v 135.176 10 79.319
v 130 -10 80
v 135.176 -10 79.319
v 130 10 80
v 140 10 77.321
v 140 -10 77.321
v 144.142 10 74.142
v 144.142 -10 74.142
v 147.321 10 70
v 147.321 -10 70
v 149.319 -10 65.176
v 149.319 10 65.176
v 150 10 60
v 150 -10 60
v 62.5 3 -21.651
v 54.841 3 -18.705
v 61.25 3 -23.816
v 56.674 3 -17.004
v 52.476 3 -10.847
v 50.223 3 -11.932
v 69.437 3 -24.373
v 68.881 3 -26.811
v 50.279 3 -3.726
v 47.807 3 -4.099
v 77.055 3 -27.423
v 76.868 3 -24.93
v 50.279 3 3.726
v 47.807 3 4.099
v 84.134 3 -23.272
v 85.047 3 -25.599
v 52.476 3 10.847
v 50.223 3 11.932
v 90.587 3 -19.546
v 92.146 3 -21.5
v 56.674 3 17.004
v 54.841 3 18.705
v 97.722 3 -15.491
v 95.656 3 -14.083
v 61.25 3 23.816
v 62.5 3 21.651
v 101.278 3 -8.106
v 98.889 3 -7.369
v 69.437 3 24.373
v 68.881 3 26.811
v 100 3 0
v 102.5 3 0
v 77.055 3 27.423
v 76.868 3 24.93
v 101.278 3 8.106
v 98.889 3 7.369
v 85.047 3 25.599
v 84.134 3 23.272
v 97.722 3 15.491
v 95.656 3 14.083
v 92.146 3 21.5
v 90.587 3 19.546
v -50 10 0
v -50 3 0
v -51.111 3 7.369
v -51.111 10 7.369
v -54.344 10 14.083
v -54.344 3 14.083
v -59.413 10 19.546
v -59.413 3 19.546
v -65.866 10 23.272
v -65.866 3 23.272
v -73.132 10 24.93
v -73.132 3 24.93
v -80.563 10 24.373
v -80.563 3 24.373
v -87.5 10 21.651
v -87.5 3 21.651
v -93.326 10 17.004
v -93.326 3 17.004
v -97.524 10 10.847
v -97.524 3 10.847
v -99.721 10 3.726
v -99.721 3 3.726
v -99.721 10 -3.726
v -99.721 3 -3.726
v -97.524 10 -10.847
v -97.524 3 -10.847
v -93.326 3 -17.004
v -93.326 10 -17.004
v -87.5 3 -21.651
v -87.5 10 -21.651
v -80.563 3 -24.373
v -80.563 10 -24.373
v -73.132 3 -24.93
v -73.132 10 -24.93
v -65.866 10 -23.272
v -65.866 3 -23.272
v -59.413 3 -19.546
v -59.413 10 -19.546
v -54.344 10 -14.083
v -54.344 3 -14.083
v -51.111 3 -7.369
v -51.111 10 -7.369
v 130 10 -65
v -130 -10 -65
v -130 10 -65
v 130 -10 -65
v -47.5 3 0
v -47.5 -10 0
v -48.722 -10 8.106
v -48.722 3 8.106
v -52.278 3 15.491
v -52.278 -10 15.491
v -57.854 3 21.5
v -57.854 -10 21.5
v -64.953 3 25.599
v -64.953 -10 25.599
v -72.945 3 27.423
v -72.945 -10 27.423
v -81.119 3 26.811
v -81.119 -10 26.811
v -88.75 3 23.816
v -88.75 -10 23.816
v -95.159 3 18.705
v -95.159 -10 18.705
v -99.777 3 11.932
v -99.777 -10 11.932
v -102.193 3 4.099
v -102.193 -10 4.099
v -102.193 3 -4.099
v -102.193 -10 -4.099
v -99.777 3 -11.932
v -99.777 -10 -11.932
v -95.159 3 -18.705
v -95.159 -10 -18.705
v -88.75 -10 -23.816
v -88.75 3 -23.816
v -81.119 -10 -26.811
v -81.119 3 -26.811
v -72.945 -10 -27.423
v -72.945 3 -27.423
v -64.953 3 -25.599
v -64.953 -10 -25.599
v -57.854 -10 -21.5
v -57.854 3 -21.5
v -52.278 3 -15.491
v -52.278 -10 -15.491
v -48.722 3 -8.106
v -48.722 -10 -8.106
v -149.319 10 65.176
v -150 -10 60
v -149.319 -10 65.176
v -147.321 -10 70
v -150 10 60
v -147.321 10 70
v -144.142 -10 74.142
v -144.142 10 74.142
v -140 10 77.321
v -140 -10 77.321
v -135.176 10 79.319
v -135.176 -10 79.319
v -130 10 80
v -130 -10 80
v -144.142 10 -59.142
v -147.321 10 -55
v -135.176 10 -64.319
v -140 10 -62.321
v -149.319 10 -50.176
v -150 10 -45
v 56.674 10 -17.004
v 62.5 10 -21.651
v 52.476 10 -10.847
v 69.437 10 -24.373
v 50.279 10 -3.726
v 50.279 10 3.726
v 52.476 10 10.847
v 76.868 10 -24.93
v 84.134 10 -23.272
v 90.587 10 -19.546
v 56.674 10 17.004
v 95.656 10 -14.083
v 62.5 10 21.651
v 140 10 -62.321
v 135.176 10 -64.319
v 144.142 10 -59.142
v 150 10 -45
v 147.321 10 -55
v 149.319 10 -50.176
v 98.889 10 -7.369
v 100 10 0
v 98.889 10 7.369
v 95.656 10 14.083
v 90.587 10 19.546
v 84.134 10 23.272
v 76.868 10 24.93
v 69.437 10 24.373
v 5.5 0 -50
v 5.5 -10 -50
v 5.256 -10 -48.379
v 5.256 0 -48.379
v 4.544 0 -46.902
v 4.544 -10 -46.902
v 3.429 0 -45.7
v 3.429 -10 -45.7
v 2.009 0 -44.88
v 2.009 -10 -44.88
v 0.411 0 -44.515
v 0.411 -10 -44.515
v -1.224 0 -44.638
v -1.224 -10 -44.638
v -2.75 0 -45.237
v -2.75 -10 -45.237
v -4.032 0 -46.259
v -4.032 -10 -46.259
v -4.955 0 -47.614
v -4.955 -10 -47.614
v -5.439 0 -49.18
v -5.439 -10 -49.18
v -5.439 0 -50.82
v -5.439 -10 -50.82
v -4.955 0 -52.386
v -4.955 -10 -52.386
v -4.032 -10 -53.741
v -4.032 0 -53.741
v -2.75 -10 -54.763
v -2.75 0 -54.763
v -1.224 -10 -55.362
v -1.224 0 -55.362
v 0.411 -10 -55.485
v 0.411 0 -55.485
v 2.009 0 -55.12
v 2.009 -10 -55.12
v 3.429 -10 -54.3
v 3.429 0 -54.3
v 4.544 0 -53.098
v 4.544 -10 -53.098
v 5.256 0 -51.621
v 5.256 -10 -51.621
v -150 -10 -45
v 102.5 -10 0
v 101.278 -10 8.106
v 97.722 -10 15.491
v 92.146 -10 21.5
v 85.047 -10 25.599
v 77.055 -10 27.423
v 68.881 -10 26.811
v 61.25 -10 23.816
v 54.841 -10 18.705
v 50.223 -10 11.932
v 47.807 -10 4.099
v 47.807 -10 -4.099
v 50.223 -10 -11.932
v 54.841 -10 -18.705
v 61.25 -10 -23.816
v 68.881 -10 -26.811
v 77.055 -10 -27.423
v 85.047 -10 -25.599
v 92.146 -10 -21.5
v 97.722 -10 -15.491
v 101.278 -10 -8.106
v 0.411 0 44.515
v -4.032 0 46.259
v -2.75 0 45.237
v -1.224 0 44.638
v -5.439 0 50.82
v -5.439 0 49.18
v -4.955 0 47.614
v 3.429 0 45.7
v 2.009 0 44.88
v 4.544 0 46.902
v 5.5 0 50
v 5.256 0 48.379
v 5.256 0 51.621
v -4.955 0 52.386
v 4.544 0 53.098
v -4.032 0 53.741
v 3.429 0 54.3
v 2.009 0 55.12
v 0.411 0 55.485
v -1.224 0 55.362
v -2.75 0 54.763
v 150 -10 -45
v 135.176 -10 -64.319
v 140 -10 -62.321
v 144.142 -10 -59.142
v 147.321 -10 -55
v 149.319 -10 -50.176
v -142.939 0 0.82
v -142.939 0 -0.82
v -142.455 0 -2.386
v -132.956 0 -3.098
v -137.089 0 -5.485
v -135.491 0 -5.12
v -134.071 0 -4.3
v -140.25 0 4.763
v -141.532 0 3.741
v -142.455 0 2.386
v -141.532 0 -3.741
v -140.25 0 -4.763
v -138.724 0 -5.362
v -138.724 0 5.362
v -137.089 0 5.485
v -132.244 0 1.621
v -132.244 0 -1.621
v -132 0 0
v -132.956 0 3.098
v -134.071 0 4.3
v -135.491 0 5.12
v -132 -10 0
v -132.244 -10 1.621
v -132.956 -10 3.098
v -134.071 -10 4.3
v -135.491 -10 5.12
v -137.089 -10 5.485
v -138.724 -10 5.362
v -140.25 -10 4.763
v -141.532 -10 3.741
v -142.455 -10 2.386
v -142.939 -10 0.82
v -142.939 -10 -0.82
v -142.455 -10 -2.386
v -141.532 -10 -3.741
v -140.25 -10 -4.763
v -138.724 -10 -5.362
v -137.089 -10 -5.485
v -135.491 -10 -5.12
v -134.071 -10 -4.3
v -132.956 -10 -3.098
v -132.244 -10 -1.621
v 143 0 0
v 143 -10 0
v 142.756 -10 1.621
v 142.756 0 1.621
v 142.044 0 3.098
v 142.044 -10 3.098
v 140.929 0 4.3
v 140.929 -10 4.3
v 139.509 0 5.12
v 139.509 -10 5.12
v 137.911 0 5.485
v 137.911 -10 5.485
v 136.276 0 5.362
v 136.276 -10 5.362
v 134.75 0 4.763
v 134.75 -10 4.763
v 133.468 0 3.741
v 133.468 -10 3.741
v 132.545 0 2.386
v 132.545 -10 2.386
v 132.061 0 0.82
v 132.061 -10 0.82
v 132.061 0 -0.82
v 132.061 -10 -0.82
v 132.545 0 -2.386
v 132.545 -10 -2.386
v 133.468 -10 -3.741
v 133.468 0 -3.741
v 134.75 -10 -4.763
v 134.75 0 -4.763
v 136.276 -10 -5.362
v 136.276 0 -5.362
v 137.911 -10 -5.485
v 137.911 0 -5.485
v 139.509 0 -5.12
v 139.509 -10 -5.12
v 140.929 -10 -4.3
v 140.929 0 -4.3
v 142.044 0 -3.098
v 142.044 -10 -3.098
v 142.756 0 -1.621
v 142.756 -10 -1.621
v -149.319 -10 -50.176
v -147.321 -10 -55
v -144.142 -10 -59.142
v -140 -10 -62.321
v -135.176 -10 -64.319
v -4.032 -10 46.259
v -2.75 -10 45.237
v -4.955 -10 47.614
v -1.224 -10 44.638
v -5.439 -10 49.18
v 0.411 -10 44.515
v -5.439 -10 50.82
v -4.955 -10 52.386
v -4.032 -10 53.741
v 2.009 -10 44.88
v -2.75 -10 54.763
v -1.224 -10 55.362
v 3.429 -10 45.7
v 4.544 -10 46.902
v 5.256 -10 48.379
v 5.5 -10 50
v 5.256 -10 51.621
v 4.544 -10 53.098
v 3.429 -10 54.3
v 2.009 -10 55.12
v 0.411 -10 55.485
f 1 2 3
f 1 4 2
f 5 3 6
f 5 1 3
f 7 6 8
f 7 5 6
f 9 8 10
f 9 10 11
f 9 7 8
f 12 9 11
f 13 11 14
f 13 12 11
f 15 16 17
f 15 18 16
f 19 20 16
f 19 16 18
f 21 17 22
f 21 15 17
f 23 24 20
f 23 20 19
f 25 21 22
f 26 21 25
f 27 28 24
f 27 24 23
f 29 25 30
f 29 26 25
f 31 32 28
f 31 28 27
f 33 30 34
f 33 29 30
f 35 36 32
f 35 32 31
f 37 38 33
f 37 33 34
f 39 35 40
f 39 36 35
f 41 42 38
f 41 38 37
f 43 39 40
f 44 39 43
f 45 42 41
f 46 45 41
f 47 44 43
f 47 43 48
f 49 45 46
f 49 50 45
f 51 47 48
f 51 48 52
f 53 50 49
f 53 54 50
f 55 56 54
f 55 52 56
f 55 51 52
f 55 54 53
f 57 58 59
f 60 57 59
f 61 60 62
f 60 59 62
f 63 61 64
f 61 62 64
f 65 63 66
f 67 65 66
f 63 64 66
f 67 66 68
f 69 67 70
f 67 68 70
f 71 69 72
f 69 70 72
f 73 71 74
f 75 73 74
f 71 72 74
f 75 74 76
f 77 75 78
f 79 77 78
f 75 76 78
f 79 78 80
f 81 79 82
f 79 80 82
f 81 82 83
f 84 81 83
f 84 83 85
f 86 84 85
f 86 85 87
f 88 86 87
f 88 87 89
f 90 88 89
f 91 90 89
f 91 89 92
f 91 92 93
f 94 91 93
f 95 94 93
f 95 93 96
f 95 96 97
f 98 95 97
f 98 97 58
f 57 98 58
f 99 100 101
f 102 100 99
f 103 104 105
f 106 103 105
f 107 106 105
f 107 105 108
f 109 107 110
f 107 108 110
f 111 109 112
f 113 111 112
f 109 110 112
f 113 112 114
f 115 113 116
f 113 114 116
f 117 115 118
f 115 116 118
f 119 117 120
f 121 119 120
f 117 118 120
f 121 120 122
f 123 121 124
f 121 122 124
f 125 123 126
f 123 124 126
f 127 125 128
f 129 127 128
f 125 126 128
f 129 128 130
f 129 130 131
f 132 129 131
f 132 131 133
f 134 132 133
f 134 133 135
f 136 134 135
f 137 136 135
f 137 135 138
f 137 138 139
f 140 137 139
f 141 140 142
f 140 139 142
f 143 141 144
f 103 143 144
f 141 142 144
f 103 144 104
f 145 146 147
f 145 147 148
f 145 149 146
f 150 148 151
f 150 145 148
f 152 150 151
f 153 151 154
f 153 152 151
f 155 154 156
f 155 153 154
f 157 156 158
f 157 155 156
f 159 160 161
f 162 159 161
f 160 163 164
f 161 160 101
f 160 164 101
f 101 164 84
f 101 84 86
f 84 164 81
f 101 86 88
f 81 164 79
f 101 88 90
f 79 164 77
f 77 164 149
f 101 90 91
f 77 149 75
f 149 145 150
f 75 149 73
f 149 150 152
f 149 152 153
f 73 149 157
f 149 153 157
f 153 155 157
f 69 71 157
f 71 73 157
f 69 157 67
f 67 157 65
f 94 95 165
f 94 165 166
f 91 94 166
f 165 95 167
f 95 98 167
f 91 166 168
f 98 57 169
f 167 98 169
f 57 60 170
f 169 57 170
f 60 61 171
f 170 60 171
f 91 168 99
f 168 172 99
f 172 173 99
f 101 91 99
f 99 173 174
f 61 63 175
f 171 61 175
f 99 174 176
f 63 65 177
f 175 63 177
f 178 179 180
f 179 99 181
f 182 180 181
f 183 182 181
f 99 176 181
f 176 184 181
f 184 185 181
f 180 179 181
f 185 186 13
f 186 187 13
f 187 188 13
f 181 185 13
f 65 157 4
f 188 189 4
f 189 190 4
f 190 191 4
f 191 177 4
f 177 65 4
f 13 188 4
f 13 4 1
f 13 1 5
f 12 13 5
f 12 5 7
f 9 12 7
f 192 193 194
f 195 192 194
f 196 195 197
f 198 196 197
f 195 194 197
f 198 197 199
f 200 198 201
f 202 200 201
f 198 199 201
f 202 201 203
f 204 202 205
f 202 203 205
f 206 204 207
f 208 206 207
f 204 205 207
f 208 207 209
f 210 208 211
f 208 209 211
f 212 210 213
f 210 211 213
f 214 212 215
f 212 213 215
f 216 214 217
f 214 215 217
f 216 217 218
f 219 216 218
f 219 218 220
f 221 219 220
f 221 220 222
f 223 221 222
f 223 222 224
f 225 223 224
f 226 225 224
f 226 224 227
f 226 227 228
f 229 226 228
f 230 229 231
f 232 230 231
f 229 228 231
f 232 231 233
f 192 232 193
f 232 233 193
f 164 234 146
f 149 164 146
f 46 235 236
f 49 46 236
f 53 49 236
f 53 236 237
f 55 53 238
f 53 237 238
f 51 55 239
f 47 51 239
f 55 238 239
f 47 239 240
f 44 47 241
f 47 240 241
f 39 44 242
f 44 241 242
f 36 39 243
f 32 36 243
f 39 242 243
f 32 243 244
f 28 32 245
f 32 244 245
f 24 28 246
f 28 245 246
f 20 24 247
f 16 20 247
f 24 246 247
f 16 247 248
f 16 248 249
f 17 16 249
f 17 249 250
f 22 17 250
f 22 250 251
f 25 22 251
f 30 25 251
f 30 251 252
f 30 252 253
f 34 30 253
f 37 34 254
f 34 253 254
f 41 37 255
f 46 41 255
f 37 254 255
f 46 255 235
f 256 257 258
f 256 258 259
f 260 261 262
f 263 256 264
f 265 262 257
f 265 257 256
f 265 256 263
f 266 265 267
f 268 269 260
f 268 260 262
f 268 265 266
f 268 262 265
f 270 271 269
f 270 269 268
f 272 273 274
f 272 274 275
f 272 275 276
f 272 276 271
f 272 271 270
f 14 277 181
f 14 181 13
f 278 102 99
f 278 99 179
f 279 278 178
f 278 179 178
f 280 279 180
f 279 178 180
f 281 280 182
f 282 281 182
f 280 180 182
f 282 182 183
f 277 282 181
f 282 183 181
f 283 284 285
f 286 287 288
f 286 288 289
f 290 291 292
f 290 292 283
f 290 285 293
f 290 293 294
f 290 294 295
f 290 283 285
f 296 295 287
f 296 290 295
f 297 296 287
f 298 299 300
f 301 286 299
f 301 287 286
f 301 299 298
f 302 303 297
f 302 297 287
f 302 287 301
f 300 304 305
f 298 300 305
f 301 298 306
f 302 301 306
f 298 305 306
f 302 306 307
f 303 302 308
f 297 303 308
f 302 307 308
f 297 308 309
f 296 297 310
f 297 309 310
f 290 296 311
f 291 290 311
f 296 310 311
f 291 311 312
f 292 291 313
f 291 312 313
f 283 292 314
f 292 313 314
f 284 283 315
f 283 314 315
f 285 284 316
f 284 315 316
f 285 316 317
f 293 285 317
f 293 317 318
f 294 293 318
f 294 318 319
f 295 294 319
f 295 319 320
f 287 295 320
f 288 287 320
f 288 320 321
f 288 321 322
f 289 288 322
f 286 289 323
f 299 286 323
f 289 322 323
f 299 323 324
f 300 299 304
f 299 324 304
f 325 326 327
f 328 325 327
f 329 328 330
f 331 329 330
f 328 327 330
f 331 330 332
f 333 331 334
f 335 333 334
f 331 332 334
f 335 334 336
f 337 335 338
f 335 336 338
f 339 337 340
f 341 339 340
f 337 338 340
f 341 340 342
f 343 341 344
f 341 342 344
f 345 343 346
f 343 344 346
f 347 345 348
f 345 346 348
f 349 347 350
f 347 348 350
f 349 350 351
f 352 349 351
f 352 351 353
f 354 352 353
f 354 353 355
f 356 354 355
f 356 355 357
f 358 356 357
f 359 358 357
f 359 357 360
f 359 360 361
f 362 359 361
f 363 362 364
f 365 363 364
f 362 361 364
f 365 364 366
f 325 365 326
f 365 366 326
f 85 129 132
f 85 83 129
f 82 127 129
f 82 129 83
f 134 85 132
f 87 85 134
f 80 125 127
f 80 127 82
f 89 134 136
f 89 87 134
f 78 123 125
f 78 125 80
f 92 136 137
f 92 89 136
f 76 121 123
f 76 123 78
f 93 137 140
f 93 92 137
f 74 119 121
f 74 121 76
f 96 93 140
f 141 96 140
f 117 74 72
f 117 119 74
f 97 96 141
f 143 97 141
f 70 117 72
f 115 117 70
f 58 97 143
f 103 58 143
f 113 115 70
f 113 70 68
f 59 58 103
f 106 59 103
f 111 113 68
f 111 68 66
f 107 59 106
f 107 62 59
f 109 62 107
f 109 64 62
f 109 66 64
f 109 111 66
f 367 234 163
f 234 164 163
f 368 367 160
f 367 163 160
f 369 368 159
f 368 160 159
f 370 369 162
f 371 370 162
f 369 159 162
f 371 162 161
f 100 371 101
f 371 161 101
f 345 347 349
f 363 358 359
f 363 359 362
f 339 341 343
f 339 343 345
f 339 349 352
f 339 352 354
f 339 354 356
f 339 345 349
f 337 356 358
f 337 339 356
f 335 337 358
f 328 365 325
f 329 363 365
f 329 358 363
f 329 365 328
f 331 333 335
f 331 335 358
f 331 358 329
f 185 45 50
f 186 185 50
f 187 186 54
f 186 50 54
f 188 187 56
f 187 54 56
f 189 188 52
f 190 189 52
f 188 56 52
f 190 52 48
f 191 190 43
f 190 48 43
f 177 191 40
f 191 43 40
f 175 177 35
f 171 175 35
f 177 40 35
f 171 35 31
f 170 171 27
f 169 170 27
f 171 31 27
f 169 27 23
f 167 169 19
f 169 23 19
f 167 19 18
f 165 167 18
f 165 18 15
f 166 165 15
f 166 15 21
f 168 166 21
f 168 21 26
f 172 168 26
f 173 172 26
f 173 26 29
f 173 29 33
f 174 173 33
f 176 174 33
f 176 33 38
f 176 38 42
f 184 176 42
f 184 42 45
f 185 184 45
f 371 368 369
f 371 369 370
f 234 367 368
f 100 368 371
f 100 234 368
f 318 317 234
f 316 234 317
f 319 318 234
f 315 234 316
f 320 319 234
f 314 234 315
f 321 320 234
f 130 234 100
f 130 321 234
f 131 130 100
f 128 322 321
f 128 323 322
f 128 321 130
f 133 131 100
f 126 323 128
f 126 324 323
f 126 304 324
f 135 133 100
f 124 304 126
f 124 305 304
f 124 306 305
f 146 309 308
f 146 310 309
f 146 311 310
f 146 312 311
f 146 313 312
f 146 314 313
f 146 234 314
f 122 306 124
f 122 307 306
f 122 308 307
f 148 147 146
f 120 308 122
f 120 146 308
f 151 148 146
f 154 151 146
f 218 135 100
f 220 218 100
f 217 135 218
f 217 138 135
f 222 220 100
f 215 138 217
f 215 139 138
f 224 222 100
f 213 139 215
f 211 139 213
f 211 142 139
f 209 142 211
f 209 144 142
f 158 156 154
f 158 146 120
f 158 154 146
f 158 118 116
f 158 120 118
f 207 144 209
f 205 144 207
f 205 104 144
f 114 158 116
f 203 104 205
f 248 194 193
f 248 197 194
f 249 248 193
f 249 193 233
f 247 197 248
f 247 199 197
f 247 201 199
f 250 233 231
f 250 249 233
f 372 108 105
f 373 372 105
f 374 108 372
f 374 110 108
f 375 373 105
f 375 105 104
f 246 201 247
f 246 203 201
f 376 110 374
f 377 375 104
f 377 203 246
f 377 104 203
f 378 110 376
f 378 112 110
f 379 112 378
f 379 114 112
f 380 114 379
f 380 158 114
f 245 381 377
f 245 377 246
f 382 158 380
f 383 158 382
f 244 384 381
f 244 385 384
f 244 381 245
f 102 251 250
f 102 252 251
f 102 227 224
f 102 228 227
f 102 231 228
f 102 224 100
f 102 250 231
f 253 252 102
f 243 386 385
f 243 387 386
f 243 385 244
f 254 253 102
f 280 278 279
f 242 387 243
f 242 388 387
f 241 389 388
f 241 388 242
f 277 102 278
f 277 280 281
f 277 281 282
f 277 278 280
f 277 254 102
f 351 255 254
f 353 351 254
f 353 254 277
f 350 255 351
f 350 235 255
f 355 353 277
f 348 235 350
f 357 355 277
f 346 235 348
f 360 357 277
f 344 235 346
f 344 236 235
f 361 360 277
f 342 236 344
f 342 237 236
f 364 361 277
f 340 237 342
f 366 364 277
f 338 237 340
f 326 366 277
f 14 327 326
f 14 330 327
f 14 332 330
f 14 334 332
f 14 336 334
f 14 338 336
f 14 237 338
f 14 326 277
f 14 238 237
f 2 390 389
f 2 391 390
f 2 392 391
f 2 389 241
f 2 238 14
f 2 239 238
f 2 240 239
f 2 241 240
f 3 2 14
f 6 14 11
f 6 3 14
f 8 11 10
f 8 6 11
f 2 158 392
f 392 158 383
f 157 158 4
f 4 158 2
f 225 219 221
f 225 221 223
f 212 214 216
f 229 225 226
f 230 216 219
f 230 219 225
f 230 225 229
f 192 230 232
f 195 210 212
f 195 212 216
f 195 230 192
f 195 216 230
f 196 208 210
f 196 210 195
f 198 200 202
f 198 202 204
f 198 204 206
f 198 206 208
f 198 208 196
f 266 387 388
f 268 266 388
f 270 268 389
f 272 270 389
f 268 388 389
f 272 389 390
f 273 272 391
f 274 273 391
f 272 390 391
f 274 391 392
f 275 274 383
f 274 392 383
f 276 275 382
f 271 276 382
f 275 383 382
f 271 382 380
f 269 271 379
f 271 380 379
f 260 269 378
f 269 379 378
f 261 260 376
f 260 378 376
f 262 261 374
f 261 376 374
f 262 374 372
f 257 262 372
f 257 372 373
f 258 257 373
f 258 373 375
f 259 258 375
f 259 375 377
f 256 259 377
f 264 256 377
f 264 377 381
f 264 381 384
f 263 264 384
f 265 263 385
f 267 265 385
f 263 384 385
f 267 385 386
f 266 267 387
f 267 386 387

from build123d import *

# Parameters (mm, degrees)
F0_W      = 300
F0_H      = 160
F1_DEPTH  = 10
F2_R      = 25
F3_DEPTH  = 20.001
F4_R      = 5.5
F5_DEPTH  = 10
F6_W      = 300
F6_H      = 15
F7_DEPTH  = 20.001
F8_R      = 20
F9_R      = 27.5
F10_DEPTH = 13


with BuildPart() as f1:
    # F0 (on Front) → F1 (new body, symmetric)
    with BuildSketch(Plane.XZ):
        Rectangle(F0_W, F0_H)
    extrude(amount=F1_DEPTH, both=True)

    # F2 (on face) → F3 (cut, through all)
    with BuildSketch(Plane.XZ.offset(10)):
        with Locations((-75, 0)):
            Circle(F2_R)
        with Locations((75, 0)):
            Circle(F2_R)
    extrude(amount=-F3_DEPTH, mode=Mode.SUBTRACT)

    # F4 (on face) → F5 (cut)
    with BuildSketch(Plane.XZ.offset(10)):
        with Locations((-137.5, 0)):
            Circle(F4_R)
        with Locations((0, 50)):
            Circle(F4_R)
        with Locations((137.5, 0)):
            Circle(F4_R)
        with Locations((0, -50)):
            Circle(F4_R)
    extrude(amount=-F5_DEPTH, mode=Mode.SUBTRACT)

    # F6 (on face) → F7 (cut, through all)
    with BuildSketch(Plane.XZ.offset(10)):
        with Locations((0, -72.5)):
            Rectangle(F6_W, F6_H)
    extrude(amount=-F7_DEPTH, mode=Mode.SUBTRACT)

    # F8
    f8_edges = [f1.edges().sort_by_distance(p)[0] for p in [
        (-150, 0, 80),
        (150, 0, 80),
        (-150, 0, -65),
        (150, 0, -65),
    ]]
    fillet(f8_edges, radius=F8_R)

    # F9 (on face) → F10 (cut)
    with BuildSketch(Plane.XZ.offset(10)):
        with Locations((-75, 0)):
            Circle(F9_R)
        with Locations((75, 0)):
            Circle(F9_R)
    extrude(amount=-F10_DEPTH, mode=Mode.SUBTRACT)


solid = f1.part
